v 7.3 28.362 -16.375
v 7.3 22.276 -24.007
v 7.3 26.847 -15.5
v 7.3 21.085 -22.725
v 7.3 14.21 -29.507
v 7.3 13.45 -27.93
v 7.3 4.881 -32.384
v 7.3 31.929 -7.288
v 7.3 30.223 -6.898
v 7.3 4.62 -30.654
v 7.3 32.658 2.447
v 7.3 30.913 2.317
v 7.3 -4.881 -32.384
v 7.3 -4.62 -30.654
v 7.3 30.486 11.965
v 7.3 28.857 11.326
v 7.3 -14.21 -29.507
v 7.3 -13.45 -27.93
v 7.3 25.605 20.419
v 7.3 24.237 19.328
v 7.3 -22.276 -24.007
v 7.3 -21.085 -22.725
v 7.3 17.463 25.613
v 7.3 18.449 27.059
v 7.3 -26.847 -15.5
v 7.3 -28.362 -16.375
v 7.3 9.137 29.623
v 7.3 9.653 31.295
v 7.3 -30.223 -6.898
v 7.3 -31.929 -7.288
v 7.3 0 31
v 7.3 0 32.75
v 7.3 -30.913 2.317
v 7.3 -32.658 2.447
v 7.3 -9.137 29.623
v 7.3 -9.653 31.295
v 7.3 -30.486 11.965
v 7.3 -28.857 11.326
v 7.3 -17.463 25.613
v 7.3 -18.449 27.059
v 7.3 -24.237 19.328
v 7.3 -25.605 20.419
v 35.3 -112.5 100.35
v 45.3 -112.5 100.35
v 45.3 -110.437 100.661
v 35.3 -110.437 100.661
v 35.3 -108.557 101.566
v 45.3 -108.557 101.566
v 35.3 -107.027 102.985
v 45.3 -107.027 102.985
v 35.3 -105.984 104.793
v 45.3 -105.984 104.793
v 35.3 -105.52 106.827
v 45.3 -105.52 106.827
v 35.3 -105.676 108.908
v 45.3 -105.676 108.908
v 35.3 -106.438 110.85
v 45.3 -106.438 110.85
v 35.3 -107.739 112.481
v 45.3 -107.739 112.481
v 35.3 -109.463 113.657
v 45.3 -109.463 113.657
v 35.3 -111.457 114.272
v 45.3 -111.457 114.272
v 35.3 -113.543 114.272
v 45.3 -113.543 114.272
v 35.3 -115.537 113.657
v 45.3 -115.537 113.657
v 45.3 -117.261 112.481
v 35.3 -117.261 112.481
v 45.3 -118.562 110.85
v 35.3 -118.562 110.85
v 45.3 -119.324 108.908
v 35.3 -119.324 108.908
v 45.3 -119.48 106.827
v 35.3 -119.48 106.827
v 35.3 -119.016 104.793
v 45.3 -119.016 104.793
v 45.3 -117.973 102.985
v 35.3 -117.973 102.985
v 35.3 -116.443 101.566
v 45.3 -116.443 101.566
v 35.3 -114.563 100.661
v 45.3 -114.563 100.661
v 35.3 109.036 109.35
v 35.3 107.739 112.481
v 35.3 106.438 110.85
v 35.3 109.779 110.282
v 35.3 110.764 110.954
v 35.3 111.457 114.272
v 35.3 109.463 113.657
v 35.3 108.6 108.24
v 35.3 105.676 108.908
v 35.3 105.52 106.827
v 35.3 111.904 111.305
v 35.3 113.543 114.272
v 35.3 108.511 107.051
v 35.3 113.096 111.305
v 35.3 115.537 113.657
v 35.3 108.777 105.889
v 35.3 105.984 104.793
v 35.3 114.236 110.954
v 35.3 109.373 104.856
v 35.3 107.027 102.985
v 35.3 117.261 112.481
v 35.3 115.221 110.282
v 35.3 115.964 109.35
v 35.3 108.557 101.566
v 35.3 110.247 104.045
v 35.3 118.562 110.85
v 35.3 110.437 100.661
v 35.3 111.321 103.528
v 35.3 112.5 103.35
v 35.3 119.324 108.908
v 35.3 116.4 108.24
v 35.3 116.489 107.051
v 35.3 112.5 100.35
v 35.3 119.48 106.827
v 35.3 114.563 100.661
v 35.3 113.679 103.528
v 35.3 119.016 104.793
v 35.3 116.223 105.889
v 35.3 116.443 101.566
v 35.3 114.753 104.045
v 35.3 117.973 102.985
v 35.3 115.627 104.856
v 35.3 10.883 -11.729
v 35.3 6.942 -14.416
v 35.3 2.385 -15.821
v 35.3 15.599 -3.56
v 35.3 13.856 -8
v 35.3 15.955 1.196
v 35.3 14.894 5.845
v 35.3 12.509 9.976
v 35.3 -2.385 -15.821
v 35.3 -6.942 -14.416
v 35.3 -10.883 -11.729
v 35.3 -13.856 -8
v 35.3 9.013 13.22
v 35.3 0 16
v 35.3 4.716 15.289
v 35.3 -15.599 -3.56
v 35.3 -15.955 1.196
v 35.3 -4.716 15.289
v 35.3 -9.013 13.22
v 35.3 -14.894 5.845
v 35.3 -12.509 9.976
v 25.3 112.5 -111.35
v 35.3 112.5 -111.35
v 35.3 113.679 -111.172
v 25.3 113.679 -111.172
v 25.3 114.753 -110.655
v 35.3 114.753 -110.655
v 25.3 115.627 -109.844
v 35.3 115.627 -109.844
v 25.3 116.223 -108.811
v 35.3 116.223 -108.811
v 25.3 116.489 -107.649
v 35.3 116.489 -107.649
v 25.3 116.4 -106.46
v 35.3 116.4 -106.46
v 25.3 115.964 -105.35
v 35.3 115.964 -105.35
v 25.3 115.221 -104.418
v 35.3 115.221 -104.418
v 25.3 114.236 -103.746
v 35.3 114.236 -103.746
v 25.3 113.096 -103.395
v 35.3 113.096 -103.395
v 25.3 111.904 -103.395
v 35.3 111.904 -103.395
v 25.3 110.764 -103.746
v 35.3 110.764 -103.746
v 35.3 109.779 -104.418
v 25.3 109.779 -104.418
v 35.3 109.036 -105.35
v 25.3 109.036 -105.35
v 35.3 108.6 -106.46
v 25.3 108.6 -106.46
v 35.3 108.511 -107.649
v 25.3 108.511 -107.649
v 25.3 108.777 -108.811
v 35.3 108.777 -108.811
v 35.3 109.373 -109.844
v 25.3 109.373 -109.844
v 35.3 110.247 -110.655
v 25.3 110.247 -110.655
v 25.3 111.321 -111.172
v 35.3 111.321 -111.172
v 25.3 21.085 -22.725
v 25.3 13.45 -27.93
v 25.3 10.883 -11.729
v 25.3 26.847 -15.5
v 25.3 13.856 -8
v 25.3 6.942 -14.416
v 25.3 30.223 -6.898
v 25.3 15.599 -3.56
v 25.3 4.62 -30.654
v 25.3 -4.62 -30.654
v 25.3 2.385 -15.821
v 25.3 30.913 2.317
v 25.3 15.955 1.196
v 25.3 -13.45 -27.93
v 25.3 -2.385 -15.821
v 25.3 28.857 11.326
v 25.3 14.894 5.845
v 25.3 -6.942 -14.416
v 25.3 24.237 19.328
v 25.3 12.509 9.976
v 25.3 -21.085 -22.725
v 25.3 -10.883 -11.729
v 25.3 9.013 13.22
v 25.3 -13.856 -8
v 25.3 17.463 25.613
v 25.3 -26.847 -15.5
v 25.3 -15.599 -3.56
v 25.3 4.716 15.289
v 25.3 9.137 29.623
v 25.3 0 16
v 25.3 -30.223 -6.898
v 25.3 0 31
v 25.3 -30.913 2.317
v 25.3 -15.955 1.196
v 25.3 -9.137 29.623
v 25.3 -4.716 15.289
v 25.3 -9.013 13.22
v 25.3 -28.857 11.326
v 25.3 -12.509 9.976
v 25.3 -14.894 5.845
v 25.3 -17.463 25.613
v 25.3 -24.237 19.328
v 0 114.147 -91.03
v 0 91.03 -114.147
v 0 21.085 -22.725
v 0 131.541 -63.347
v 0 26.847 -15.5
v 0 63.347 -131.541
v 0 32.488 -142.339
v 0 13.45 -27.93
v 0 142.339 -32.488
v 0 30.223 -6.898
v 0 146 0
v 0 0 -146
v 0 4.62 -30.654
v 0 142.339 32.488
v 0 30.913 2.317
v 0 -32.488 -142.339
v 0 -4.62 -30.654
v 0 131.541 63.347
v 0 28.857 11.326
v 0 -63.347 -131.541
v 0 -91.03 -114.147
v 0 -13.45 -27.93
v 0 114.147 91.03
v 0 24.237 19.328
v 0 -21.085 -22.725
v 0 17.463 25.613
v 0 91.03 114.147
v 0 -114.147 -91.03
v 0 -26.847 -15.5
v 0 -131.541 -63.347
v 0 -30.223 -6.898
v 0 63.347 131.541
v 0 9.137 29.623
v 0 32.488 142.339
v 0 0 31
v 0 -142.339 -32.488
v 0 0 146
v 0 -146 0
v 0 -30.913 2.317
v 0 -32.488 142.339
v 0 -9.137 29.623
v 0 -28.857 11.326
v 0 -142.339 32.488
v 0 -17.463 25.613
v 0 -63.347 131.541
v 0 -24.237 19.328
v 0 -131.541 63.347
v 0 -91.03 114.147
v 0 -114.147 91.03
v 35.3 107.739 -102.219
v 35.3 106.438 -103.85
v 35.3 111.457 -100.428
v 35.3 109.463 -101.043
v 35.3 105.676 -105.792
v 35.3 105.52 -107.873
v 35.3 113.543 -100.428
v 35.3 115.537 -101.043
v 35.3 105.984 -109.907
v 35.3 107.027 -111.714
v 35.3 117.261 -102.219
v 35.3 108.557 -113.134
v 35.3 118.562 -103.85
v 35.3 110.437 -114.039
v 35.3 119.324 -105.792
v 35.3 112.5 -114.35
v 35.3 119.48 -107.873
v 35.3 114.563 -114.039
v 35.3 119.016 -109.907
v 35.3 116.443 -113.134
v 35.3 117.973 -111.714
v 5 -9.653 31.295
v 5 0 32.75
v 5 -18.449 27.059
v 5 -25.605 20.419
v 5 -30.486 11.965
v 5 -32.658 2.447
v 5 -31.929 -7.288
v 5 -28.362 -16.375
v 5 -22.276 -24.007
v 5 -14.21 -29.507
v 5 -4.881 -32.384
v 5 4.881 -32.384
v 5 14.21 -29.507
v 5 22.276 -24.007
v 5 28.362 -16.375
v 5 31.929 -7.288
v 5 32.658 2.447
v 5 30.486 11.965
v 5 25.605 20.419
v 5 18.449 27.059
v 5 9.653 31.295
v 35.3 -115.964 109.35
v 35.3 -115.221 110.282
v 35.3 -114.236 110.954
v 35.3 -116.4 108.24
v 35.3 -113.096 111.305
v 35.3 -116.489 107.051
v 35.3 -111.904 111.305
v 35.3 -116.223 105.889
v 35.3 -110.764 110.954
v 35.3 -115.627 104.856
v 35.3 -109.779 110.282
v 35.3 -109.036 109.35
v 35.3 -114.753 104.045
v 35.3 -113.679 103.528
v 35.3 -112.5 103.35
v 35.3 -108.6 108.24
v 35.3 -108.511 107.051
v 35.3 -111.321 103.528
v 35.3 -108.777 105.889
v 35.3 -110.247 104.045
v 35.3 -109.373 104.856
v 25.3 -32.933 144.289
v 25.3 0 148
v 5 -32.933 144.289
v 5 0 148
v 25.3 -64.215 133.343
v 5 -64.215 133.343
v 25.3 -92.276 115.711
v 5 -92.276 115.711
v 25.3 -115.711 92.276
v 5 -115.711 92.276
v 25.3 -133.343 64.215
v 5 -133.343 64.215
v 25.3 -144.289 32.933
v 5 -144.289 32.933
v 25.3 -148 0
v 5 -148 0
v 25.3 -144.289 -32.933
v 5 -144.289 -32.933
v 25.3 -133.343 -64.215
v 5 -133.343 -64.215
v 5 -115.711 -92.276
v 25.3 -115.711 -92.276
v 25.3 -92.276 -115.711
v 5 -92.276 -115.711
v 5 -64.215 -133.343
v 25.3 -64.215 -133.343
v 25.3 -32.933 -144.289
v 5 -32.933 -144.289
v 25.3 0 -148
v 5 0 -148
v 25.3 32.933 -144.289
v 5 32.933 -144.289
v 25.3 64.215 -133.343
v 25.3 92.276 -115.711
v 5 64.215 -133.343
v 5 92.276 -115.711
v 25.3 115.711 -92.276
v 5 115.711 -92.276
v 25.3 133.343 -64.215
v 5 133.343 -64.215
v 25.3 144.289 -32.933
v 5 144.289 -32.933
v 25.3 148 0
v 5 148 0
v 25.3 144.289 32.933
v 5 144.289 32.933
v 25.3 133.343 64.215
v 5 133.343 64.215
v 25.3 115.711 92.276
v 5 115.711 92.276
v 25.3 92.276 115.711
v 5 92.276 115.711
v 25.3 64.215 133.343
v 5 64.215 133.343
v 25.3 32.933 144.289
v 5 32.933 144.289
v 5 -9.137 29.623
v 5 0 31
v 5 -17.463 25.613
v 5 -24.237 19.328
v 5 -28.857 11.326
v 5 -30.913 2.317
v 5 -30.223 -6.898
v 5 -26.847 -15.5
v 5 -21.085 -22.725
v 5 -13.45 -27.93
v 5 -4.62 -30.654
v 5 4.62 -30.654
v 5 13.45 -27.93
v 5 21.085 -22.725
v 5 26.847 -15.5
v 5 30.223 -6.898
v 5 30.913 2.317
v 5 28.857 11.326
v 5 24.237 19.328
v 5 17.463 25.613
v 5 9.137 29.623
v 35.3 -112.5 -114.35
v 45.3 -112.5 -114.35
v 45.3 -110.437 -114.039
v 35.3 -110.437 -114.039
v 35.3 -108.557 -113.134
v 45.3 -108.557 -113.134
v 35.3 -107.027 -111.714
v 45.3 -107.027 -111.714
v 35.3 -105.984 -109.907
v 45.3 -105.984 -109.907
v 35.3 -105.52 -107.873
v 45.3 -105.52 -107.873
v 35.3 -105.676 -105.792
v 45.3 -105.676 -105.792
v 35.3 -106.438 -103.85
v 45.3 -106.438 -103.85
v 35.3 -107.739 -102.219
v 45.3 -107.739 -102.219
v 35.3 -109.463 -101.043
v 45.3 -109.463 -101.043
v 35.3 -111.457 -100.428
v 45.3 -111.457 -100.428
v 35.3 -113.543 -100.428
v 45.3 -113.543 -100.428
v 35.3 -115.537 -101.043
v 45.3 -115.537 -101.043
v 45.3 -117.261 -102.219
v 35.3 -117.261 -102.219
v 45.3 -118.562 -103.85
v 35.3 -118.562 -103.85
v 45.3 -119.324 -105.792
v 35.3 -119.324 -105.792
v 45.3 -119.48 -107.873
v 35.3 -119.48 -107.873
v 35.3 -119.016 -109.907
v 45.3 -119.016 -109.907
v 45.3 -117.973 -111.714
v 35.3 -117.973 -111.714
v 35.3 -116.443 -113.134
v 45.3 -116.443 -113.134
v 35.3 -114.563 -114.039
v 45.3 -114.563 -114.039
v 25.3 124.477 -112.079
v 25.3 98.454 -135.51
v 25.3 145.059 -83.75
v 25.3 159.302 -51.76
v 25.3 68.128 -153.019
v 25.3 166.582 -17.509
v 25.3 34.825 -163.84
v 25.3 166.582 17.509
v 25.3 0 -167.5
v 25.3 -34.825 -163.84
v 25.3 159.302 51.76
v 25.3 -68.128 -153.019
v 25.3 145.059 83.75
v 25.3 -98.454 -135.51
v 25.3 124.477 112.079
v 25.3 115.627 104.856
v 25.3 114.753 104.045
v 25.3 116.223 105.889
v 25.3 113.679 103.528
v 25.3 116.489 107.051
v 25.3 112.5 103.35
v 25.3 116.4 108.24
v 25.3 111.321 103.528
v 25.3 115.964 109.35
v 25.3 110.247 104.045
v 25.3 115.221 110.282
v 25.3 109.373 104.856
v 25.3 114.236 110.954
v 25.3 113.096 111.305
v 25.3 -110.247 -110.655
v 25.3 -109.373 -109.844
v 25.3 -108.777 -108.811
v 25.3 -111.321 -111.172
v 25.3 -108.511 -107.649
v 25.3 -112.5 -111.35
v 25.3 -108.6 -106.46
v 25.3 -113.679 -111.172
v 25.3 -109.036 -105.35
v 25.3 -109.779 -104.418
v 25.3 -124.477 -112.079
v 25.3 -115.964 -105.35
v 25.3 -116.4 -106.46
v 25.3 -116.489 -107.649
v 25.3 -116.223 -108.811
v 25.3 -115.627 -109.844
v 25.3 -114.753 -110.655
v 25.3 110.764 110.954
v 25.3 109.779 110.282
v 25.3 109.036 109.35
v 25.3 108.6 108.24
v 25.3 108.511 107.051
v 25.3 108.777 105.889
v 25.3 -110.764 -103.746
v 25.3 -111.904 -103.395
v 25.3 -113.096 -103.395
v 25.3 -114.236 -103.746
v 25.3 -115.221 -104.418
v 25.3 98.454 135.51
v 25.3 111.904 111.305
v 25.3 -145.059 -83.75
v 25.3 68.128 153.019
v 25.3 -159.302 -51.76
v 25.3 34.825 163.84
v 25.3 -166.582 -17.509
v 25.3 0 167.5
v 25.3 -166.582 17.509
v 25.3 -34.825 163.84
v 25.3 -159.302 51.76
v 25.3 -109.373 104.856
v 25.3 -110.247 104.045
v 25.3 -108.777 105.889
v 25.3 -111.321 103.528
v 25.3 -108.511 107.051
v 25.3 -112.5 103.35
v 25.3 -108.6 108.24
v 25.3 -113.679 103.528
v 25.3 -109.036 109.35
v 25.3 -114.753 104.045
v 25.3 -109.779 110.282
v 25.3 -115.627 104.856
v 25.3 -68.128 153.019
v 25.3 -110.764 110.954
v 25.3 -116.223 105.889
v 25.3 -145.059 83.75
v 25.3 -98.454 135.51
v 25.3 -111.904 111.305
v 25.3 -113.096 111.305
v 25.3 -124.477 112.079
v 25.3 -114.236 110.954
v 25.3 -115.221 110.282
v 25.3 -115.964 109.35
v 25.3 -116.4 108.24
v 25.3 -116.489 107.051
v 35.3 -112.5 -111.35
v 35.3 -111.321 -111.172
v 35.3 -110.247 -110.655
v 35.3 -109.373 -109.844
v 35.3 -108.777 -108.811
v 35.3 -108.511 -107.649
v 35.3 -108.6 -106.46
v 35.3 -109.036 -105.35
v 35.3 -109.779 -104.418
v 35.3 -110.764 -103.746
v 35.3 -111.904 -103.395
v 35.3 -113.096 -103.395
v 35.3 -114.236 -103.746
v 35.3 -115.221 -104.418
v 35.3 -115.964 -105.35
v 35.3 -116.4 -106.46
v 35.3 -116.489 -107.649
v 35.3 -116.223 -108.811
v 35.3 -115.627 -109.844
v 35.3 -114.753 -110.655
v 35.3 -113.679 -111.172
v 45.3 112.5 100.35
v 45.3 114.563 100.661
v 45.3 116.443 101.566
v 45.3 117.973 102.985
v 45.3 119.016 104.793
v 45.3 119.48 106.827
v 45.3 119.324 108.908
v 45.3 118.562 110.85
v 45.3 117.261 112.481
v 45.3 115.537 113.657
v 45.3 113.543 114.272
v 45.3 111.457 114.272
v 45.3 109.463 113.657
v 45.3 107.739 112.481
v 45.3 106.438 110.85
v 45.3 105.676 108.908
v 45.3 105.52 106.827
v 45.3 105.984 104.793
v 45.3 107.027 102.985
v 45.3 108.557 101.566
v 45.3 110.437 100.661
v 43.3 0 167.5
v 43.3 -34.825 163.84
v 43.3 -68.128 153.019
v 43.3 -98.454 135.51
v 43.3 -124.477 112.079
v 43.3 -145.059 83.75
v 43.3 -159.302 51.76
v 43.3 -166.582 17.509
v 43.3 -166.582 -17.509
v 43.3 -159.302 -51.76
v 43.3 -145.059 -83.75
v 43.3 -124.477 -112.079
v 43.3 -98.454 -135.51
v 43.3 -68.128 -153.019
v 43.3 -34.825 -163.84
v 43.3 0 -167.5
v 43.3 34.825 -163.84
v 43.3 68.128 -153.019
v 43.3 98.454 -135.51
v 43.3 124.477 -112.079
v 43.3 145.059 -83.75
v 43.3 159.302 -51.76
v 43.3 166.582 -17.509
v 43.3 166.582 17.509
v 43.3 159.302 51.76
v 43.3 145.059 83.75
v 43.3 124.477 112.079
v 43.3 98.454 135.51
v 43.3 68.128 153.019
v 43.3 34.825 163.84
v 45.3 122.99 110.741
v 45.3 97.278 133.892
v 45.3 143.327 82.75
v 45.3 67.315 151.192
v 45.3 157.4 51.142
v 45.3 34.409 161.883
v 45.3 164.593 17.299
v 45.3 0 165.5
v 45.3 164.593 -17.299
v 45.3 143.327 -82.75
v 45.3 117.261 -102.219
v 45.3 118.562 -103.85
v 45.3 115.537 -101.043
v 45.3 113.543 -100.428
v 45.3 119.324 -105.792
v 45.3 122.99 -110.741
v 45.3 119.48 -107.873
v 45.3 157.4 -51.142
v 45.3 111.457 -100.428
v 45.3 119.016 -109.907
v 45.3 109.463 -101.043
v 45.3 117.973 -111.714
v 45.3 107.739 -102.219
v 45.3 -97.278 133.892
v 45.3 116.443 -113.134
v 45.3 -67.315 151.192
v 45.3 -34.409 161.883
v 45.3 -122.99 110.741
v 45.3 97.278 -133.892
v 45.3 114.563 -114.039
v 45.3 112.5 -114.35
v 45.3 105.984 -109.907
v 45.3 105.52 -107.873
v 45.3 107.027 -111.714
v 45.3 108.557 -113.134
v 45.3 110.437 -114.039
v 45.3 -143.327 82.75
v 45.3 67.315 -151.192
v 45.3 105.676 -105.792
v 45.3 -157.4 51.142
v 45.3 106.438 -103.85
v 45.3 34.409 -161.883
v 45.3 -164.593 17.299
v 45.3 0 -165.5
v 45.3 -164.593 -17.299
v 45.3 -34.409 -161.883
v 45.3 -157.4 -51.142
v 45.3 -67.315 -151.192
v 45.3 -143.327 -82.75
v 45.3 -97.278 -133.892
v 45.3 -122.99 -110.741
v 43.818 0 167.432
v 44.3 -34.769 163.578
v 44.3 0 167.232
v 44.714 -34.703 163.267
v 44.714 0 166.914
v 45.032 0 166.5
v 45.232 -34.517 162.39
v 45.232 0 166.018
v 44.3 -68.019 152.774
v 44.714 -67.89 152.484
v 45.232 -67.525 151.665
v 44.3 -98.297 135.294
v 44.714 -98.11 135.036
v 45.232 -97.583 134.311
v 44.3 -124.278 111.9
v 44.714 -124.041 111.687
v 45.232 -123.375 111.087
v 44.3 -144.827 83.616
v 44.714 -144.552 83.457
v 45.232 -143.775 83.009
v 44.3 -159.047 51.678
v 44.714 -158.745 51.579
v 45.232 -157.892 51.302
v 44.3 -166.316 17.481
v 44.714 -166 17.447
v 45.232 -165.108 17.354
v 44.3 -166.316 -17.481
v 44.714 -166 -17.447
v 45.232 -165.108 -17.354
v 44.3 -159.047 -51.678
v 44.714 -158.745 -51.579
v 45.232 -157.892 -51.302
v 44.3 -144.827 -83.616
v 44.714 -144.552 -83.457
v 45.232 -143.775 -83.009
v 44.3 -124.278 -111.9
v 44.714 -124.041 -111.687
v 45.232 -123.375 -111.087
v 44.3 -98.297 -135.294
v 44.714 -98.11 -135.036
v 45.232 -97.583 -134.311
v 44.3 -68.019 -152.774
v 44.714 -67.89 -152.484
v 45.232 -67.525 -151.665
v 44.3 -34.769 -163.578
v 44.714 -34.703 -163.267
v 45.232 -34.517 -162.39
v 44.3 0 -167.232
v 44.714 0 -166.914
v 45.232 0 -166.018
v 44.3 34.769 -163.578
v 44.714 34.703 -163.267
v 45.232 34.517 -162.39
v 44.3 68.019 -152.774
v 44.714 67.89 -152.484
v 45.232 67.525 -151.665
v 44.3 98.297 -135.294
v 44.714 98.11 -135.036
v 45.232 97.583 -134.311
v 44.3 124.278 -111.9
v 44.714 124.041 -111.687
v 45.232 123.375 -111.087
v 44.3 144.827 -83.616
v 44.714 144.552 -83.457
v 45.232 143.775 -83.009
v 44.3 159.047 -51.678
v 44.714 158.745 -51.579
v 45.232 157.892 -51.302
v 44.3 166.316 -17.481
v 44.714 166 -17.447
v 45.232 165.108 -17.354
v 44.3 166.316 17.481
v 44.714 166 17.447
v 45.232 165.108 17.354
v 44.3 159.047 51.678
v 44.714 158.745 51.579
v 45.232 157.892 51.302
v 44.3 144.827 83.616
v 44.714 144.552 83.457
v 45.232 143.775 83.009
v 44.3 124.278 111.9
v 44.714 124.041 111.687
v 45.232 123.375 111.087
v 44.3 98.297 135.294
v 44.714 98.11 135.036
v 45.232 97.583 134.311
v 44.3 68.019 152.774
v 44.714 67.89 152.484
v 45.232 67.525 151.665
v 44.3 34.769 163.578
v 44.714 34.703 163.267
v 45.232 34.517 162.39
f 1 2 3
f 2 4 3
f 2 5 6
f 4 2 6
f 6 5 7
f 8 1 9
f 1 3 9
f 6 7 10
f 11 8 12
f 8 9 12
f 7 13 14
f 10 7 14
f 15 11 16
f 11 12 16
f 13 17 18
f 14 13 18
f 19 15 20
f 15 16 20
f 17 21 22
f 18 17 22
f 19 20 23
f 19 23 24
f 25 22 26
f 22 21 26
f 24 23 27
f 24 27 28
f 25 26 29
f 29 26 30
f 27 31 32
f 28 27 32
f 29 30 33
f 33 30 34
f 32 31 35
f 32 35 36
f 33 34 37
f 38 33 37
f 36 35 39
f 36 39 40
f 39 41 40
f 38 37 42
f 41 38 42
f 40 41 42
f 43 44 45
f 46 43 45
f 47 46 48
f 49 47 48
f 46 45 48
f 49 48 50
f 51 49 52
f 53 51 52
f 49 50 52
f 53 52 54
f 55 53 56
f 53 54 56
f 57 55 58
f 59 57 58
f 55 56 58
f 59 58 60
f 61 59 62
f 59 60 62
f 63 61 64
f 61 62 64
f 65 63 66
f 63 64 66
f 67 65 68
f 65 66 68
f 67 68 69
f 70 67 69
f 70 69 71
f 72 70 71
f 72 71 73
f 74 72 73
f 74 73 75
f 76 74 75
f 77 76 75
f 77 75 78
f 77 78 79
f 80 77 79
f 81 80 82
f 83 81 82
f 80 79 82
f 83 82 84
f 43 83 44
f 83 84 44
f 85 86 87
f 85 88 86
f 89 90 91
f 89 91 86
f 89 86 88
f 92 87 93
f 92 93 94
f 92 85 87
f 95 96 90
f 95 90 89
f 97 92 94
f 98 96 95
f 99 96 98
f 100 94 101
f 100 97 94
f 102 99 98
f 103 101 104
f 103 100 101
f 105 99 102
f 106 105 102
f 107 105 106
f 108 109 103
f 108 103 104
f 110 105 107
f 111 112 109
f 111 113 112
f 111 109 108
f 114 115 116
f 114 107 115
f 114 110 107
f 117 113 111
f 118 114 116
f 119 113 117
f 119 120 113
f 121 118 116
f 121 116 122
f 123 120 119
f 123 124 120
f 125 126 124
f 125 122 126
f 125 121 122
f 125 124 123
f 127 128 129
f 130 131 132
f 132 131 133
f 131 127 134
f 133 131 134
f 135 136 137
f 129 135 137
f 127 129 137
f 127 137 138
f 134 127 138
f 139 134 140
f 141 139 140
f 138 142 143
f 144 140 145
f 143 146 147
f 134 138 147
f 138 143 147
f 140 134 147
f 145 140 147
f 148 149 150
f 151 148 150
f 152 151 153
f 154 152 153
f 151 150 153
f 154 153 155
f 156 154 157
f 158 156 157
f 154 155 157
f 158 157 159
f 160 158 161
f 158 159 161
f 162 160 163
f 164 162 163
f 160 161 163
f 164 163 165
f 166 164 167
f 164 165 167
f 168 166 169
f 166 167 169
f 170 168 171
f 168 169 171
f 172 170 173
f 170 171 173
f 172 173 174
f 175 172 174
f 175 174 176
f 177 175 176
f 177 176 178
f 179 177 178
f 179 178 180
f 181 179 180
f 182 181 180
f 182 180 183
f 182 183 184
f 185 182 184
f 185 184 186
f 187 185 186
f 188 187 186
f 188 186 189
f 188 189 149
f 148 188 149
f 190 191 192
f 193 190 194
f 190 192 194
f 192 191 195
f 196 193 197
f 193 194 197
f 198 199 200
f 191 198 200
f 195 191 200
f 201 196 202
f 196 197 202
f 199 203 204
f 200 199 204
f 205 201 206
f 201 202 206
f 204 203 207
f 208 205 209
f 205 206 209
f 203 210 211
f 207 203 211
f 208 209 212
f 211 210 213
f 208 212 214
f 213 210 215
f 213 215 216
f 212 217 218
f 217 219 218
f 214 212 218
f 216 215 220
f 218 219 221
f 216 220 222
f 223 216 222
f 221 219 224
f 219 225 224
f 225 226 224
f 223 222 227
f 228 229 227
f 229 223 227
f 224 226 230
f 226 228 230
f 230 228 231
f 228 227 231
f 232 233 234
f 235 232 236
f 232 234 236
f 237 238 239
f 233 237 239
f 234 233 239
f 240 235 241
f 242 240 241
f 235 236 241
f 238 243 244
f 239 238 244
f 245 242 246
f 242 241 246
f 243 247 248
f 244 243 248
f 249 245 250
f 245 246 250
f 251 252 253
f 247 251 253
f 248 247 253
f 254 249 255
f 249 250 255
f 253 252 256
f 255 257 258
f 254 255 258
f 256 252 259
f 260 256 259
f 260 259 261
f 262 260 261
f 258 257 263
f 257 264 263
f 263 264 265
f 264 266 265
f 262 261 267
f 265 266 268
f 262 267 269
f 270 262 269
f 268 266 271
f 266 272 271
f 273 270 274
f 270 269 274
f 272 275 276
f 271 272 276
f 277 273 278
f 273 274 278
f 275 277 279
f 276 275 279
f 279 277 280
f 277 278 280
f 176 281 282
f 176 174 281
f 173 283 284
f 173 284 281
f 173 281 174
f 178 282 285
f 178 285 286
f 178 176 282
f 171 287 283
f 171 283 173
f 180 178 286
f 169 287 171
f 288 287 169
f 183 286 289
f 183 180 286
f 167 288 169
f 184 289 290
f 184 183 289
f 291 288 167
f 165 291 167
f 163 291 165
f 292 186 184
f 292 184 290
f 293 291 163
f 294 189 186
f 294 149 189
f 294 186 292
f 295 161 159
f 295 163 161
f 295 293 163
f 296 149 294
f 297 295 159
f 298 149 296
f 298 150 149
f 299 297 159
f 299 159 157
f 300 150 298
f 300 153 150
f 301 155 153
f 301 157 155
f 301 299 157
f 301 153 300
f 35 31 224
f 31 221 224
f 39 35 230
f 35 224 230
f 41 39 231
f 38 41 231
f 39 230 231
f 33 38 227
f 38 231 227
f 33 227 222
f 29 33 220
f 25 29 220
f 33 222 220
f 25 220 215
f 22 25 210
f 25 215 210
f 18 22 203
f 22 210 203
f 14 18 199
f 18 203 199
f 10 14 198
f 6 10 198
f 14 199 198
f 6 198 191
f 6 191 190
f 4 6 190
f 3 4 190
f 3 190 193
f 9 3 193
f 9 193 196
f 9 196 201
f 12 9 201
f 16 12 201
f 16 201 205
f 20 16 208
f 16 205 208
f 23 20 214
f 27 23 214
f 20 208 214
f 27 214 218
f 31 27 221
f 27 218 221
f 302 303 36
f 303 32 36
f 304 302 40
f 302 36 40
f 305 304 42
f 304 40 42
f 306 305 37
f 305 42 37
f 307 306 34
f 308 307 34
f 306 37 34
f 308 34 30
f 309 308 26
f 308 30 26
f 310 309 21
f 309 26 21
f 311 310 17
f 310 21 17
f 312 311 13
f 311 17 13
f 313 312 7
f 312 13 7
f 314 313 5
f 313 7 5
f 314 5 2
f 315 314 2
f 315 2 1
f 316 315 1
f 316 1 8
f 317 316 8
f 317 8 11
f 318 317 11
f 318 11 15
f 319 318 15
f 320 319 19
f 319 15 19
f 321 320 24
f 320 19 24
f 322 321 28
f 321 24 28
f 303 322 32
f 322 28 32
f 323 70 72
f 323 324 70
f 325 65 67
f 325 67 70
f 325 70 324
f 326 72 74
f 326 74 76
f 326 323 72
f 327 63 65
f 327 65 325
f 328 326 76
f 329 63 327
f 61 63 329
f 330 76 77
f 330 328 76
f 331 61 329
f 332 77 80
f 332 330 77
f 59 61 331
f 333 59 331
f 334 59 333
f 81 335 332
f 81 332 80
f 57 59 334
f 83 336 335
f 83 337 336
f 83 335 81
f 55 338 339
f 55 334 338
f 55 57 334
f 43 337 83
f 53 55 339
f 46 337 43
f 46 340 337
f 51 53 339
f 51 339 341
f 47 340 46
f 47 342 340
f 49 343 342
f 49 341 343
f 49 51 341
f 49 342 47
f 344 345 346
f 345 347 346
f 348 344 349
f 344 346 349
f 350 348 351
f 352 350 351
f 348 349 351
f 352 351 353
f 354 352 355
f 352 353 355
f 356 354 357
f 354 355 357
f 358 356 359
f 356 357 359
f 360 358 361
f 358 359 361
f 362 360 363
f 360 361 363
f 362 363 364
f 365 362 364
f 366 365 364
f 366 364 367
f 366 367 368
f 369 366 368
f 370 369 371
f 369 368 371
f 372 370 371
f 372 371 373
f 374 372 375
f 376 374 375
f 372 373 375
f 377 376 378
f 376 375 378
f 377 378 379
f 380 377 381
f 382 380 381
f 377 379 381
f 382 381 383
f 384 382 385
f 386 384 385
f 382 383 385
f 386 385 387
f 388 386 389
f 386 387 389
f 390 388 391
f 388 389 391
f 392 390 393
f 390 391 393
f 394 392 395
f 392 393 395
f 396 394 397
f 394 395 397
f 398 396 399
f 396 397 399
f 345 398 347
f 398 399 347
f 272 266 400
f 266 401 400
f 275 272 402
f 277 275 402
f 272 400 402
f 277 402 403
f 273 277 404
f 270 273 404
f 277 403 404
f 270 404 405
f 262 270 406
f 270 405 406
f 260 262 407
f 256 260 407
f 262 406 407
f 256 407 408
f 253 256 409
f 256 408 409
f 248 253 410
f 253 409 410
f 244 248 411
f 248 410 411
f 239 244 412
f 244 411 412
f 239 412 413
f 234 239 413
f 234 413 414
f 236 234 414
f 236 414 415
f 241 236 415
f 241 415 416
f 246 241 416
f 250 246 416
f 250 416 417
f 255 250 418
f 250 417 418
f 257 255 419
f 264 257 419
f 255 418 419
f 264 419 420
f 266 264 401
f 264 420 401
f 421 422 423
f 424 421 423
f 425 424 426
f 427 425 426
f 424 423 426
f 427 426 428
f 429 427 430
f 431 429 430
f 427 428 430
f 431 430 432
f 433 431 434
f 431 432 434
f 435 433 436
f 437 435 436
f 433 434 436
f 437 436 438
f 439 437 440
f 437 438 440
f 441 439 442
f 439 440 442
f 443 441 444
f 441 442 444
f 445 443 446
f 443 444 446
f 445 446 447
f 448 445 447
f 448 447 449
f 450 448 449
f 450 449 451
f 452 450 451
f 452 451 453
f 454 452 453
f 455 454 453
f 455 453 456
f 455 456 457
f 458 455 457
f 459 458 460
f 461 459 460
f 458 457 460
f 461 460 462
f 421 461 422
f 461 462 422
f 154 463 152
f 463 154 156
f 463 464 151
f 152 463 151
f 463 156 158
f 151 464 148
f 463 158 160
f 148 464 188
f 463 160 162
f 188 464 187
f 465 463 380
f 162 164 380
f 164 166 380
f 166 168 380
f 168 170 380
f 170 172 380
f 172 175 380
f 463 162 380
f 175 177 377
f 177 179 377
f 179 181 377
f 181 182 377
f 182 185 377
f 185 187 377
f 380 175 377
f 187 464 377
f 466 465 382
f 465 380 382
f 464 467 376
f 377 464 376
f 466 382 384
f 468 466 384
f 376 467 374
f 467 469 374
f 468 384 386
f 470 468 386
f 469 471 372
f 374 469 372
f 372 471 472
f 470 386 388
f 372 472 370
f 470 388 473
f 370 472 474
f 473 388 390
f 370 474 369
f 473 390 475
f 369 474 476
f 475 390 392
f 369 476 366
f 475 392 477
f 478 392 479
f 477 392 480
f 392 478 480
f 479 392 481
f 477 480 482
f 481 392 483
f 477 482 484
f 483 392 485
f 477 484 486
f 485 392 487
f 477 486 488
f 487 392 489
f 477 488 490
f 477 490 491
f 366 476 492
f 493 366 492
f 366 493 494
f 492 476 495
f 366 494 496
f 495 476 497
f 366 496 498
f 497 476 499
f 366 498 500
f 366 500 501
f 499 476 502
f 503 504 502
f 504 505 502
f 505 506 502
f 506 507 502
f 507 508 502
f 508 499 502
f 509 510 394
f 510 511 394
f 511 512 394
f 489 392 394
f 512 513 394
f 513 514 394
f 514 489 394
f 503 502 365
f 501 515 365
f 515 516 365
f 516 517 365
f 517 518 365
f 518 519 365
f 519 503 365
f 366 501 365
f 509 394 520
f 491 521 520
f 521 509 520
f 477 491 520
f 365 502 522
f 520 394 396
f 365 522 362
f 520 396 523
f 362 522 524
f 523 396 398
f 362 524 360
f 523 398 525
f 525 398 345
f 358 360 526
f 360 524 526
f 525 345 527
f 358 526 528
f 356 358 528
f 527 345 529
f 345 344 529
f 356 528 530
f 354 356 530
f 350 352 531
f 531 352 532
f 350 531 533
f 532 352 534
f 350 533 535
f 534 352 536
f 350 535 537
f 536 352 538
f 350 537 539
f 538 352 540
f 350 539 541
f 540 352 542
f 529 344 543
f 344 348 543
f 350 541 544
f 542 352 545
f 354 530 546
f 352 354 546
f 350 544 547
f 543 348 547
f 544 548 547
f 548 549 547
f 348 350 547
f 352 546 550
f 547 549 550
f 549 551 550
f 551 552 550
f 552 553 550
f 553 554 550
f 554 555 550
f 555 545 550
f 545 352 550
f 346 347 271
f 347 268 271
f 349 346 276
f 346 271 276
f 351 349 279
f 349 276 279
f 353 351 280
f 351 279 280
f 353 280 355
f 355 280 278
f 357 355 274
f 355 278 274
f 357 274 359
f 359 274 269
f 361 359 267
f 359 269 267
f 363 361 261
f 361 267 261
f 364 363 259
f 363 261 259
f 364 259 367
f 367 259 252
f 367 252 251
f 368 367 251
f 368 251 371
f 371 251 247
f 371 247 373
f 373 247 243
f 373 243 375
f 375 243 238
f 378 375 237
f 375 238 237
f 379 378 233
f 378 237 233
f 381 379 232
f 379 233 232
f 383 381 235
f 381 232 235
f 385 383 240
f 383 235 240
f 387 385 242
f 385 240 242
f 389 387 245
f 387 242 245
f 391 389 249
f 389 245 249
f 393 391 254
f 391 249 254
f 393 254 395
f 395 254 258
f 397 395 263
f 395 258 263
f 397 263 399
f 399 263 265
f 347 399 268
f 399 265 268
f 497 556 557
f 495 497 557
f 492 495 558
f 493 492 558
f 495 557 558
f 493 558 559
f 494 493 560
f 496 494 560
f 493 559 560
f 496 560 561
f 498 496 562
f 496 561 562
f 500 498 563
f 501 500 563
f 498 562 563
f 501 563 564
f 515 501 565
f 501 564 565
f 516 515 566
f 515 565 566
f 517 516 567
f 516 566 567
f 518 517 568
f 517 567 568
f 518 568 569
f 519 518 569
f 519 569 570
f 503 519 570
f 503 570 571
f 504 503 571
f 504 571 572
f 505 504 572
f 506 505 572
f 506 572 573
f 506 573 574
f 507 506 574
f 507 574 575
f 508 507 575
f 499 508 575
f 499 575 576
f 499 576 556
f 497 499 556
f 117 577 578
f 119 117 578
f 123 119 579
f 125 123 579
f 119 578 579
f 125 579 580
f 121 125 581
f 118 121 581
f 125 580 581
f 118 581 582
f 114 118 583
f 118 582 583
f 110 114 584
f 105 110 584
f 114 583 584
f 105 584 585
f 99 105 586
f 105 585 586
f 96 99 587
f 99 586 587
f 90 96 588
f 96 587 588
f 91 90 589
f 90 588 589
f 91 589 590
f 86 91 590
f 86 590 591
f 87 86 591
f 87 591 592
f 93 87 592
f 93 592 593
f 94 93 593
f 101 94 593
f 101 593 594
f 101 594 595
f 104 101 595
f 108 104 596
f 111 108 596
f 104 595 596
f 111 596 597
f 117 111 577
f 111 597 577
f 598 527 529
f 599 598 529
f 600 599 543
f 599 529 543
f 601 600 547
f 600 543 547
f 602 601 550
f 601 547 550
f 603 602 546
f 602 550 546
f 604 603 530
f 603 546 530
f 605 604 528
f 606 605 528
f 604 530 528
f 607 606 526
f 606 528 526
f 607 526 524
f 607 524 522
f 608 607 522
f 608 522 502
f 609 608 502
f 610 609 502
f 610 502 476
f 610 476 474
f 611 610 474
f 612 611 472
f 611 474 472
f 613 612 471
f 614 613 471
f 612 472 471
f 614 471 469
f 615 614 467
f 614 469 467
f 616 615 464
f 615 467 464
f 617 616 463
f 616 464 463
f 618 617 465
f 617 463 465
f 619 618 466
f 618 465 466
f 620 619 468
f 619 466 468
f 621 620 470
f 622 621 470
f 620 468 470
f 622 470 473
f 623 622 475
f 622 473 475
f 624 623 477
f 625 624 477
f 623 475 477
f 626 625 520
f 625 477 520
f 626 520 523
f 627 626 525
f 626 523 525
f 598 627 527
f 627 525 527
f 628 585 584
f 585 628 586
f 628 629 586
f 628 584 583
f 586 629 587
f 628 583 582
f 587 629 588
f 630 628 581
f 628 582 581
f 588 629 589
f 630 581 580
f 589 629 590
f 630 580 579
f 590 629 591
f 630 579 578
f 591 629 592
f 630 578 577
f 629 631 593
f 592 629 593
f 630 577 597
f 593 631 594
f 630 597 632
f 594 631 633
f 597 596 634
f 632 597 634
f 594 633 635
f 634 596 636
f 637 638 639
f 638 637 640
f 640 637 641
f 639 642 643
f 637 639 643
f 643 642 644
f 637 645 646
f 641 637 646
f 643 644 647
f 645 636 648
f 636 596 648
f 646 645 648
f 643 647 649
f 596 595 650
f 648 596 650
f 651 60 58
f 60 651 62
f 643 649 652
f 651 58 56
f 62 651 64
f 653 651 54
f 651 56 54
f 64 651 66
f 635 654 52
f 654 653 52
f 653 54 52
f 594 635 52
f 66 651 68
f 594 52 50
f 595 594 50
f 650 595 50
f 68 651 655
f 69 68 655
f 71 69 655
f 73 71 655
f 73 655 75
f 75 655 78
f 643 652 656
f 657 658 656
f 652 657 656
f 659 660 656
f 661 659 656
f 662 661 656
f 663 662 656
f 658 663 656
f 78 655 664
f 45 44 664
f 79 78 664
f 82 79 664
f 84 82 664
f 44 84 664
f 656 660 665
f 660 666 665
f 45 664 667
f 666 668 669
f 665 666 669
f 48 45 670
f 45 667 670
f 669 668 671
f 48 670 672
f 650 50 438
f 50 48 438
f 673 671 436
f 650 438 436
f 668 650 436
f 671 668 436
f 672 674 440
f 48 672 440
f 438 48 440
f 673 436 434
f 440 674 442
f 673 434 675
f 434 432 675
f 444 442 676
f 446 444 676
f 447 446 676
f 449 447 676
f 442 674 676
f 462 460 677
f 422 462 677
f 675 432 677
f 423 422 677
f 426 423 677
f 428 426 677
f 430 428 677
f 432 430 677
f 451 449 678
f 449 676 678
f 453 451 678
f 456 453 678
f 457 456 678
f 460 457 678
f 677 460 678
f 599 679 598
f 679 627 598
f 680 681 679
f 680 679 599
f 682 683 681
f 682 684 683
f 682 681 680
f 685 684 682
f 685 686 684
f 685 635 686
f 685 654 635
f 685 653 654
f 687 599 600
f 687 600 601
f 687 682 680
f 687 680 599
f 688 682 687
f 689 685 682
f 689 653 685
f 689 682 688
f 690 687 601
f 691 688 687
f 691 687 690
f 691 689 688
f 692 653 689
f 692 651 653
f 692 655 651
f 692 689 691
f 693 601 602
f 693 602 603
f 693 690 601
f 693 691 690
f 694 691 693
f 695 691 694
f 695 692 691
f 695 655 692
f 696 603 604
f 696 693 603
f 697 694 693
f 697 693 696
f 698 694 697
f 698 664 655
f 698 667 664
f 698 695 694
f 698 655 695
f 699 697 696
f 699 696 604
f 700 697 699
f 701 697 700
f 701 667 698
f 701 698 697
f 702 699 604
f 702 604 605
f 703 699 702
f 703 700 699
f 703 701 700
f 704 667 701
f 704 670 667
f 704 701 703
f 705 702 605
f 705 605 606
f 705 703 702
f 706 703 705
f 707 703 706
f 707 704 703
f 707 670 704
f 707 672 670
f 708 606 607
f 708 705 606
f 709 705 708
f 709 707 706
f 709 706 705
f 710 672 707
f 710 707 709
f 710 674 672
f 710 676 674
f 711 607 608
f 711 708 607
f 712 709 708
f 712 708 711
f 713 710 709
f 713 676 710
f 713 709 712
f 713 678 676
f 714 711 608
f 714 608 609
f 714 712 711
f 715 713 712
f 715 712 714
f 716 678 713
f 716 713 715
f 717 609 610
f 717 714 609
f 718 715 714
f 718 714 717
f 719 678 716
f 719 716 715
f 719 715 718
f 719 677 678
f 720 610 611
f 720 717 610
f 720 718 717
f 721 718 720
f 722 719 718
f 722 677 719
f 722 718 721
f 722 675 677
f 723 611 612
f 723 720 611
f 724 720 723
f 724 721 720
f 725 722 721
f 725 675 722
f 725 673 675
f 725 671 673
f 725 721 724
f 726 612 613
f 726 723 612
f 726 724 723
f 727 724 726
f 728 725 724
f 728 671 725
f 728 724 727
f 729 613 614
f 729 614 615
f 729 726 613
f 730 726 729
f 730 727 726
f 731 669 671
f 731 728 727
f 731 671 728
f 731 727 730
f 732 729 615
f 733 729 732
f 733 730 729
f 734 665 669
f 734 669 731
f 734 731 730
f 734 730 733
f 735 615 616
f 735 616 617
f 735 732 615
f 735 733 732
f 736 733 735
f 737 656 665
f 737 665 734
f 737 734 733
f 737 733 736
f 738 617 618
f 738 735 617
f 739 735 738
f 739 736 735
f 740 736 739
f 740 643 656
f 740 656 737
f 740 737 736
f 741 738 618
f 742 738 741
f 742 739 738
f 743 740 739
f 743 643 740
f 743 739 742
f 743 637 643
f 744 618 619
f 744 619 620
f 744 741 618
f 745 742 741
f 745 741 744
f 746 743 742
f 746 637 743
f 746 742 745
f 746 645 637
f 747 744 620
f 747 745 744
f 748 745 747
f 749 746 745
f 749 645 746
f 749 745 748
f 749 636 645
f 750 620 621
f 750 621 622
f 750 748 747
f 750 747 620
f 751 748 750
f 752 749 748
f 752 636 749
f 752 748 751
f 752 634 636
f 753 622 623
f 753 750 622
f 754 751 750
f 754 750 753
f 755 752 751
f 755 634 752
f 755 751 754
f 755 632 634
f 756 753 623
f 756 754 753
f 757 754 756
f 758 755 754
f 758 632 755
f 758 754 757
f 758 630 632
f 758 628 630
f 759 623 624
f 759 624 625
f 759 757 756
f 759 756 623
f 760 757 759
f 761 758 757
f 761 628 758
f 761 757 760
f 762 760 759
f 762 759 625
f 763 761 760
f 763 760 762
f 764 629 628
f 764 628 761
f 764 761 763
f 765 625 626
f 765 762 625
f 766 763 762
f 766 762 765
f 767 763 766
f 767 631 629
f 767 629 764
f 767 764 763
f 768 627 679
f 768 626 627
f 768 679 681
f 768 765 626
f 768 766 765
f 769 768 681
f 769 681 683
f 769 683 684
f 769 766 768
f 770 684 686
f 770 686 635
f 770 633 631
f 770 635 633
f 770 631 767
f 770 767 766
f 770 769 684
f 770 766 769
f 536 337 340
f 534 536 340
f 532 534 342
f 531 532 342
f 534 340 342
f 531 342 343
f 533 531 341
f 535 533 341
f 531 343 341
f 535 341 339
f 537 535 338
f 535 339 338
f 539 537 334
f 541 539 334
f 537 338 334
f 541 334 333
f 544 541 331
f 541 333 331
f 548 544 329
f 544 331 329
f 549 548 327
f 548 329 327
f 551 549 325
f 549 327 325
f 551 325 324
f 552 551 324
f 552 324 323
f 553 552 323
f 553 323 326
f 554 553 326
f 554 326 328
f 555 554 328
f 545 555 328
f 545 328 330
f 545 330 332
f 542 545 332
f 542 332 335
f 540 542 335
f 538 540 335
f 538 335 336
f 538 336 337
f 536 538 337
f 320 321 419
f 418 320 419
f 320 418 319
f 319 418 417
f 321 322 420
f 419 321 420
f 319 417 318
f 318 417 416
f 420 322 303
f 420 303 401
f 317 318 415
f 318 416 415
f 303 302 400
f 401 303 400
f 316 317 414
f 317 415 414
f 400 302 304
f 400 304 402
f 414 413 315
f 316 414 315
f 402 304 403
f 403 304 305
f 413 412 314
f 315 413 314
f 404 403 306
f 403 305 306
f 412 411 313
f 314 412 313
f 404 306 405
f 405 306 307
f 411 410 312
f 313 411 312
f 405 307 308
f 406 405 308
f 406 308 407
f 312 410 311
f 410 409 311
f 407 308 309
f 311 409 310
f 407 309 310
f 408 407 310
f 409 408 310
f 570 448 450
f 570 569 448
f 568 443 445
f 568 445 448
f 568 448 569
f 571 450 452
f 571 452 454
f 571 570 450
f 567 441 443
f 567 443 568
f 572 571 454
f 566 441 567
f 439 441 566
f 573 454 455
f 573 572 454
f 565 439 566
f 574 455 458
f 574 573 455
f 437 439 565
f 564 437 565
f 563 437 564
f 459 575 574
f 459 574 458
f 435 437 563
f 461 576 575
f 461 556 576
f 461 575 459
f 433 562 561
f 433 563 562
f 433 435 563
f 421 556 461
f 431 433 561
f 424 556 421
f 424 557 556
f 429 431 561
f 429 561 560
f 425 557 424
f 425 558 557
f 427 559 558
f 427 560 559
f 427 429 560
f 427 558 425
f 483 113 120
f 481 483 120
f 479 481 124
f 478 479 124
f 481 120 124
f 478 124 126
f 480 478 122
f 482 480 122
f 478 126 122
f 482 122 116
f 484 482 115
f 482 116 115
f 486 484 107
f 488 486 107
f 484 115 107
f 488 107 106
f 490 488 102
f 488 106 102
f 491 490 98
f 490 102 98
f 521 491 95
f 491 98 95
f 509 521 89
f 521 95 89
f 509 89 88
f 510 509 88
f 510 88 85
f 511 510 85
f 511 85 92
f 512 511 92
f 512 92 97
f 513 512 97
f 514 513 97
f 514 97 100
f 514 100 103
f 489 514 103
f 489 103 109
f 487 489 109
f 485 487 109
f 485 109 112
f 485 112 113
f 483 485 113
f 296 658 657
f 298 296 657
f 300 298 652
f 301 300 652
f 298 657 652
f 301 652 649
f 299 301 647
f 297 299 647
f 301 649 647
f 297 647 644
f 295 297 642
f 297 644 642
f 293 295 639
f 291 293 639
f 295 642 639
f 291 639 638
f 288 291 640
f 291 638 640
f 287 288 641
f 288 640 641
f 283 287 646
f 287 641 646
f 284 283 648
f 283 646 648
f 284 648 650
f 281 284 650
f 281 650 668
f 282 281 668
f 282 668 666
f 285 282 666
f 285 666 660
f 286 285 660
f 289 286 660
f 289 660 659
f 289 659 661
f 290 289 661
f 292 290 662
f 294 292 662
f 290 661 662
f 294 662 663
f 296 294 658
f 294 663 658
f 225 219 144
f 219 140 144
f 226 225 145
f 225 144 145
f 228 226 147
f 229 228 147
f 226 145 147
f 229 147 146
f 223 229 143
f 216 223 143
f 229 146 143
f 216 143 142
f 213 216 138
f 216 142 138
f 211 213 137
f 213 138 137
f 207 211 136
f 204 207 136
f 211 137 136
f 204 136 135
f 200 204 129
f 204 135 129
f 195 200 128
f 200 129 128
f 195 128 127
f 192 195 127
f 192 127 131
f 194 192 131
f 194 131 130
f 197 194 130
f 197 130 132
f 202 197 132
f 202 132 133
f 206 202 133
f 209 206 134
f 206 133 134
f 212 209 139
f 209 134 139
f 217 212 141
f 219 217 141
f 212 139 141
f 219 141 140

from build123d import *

# Parameters (mm, degrees)
IZIM2_R               = 4
KES_EKSTR_ZYON1_DEPTH = 20
IZIM3_R               = 7
KES_EKSTR_ZYON2_DEPTH = 10
RADYUS1_R             = 2


with BuildPart() as part:
    # Çizim1 → Döndür1 (revolve)
    with BuildSketch(Plane.XY, mode=Mode.PRIVATE) as d_nd_r1_sk:
        Polygon((0, 31), (5, 31), (5, 32.75), (7.3, 32.75), (7.3, 31), (25.3, 31), (25.3, 16), (35.3, 16), (35.3, 0), (45.3, 0), (45.3, 161), (45.3, 167.5), (25.3, 167.5), (25.3, 148), (5, 148), (0, 146), align=None)
    revolve(d_nd_r1_sk.sketch.rotate(Axis((0, 0, 0), (1, 0, 0)), 90), axis=Axis((0, 0, 0), (1, 0, 0)))

    # Çizim2 → Kes-Ekstrüzyon1 (cut)
    with BuildSketch(Plane(origin=(45.3, 0, 0), x_dir=(0, 0, -1), z_dir=(1, 0, 0))):
        with Locations((-107.349895203, 112.5)):
            Circle(IZIM2_R)
        with Locations((107.349895203, 112.5)):
            Circle(IZIM2_R)
        with Locations((107.349895203, -112.5)):
            Circle(IZIM2_R)
        with Locations((-107.349895203, -112.5)):
            Circle(IZIM2_R)
    extrude(amount=-KES_EKSTR_ZYON1_DEPTH, mode=Mode.SUBTRACT)

    # Çizim3 → Kes-Ekstrüzyon2 (cut)
    with BuildSketch(Plane(origin=(45.3, 0, 0), x_dir=(0, 0, -1), z_dir=(1, 0, 0))):
        with Locations((-107.349895203, 112.5)):
            Circle(IZIM3_R)
        with Locations((107.349895203, 112.5)):
            Circle(IZIM3_R)
        with Locations((107.349895203, -112.5)):
            Circle(IZIM3_R)
        with Locations((-107.349895203, -112.5)):
            Circle(IZIM3_R)
    extrude(amount=-KES_EKSTR_ZYON2_DEPTH, mode=Mode.SUBTRACT)

    # Radyus1
    radyus1_edges = [part.edges().sort_by_distance(p)[0] for p in [
        (45.3, 0, -167.5),
    ]]
    fillet(radyus1_edges, radius=RADYUS1_R)


solid = part.part
